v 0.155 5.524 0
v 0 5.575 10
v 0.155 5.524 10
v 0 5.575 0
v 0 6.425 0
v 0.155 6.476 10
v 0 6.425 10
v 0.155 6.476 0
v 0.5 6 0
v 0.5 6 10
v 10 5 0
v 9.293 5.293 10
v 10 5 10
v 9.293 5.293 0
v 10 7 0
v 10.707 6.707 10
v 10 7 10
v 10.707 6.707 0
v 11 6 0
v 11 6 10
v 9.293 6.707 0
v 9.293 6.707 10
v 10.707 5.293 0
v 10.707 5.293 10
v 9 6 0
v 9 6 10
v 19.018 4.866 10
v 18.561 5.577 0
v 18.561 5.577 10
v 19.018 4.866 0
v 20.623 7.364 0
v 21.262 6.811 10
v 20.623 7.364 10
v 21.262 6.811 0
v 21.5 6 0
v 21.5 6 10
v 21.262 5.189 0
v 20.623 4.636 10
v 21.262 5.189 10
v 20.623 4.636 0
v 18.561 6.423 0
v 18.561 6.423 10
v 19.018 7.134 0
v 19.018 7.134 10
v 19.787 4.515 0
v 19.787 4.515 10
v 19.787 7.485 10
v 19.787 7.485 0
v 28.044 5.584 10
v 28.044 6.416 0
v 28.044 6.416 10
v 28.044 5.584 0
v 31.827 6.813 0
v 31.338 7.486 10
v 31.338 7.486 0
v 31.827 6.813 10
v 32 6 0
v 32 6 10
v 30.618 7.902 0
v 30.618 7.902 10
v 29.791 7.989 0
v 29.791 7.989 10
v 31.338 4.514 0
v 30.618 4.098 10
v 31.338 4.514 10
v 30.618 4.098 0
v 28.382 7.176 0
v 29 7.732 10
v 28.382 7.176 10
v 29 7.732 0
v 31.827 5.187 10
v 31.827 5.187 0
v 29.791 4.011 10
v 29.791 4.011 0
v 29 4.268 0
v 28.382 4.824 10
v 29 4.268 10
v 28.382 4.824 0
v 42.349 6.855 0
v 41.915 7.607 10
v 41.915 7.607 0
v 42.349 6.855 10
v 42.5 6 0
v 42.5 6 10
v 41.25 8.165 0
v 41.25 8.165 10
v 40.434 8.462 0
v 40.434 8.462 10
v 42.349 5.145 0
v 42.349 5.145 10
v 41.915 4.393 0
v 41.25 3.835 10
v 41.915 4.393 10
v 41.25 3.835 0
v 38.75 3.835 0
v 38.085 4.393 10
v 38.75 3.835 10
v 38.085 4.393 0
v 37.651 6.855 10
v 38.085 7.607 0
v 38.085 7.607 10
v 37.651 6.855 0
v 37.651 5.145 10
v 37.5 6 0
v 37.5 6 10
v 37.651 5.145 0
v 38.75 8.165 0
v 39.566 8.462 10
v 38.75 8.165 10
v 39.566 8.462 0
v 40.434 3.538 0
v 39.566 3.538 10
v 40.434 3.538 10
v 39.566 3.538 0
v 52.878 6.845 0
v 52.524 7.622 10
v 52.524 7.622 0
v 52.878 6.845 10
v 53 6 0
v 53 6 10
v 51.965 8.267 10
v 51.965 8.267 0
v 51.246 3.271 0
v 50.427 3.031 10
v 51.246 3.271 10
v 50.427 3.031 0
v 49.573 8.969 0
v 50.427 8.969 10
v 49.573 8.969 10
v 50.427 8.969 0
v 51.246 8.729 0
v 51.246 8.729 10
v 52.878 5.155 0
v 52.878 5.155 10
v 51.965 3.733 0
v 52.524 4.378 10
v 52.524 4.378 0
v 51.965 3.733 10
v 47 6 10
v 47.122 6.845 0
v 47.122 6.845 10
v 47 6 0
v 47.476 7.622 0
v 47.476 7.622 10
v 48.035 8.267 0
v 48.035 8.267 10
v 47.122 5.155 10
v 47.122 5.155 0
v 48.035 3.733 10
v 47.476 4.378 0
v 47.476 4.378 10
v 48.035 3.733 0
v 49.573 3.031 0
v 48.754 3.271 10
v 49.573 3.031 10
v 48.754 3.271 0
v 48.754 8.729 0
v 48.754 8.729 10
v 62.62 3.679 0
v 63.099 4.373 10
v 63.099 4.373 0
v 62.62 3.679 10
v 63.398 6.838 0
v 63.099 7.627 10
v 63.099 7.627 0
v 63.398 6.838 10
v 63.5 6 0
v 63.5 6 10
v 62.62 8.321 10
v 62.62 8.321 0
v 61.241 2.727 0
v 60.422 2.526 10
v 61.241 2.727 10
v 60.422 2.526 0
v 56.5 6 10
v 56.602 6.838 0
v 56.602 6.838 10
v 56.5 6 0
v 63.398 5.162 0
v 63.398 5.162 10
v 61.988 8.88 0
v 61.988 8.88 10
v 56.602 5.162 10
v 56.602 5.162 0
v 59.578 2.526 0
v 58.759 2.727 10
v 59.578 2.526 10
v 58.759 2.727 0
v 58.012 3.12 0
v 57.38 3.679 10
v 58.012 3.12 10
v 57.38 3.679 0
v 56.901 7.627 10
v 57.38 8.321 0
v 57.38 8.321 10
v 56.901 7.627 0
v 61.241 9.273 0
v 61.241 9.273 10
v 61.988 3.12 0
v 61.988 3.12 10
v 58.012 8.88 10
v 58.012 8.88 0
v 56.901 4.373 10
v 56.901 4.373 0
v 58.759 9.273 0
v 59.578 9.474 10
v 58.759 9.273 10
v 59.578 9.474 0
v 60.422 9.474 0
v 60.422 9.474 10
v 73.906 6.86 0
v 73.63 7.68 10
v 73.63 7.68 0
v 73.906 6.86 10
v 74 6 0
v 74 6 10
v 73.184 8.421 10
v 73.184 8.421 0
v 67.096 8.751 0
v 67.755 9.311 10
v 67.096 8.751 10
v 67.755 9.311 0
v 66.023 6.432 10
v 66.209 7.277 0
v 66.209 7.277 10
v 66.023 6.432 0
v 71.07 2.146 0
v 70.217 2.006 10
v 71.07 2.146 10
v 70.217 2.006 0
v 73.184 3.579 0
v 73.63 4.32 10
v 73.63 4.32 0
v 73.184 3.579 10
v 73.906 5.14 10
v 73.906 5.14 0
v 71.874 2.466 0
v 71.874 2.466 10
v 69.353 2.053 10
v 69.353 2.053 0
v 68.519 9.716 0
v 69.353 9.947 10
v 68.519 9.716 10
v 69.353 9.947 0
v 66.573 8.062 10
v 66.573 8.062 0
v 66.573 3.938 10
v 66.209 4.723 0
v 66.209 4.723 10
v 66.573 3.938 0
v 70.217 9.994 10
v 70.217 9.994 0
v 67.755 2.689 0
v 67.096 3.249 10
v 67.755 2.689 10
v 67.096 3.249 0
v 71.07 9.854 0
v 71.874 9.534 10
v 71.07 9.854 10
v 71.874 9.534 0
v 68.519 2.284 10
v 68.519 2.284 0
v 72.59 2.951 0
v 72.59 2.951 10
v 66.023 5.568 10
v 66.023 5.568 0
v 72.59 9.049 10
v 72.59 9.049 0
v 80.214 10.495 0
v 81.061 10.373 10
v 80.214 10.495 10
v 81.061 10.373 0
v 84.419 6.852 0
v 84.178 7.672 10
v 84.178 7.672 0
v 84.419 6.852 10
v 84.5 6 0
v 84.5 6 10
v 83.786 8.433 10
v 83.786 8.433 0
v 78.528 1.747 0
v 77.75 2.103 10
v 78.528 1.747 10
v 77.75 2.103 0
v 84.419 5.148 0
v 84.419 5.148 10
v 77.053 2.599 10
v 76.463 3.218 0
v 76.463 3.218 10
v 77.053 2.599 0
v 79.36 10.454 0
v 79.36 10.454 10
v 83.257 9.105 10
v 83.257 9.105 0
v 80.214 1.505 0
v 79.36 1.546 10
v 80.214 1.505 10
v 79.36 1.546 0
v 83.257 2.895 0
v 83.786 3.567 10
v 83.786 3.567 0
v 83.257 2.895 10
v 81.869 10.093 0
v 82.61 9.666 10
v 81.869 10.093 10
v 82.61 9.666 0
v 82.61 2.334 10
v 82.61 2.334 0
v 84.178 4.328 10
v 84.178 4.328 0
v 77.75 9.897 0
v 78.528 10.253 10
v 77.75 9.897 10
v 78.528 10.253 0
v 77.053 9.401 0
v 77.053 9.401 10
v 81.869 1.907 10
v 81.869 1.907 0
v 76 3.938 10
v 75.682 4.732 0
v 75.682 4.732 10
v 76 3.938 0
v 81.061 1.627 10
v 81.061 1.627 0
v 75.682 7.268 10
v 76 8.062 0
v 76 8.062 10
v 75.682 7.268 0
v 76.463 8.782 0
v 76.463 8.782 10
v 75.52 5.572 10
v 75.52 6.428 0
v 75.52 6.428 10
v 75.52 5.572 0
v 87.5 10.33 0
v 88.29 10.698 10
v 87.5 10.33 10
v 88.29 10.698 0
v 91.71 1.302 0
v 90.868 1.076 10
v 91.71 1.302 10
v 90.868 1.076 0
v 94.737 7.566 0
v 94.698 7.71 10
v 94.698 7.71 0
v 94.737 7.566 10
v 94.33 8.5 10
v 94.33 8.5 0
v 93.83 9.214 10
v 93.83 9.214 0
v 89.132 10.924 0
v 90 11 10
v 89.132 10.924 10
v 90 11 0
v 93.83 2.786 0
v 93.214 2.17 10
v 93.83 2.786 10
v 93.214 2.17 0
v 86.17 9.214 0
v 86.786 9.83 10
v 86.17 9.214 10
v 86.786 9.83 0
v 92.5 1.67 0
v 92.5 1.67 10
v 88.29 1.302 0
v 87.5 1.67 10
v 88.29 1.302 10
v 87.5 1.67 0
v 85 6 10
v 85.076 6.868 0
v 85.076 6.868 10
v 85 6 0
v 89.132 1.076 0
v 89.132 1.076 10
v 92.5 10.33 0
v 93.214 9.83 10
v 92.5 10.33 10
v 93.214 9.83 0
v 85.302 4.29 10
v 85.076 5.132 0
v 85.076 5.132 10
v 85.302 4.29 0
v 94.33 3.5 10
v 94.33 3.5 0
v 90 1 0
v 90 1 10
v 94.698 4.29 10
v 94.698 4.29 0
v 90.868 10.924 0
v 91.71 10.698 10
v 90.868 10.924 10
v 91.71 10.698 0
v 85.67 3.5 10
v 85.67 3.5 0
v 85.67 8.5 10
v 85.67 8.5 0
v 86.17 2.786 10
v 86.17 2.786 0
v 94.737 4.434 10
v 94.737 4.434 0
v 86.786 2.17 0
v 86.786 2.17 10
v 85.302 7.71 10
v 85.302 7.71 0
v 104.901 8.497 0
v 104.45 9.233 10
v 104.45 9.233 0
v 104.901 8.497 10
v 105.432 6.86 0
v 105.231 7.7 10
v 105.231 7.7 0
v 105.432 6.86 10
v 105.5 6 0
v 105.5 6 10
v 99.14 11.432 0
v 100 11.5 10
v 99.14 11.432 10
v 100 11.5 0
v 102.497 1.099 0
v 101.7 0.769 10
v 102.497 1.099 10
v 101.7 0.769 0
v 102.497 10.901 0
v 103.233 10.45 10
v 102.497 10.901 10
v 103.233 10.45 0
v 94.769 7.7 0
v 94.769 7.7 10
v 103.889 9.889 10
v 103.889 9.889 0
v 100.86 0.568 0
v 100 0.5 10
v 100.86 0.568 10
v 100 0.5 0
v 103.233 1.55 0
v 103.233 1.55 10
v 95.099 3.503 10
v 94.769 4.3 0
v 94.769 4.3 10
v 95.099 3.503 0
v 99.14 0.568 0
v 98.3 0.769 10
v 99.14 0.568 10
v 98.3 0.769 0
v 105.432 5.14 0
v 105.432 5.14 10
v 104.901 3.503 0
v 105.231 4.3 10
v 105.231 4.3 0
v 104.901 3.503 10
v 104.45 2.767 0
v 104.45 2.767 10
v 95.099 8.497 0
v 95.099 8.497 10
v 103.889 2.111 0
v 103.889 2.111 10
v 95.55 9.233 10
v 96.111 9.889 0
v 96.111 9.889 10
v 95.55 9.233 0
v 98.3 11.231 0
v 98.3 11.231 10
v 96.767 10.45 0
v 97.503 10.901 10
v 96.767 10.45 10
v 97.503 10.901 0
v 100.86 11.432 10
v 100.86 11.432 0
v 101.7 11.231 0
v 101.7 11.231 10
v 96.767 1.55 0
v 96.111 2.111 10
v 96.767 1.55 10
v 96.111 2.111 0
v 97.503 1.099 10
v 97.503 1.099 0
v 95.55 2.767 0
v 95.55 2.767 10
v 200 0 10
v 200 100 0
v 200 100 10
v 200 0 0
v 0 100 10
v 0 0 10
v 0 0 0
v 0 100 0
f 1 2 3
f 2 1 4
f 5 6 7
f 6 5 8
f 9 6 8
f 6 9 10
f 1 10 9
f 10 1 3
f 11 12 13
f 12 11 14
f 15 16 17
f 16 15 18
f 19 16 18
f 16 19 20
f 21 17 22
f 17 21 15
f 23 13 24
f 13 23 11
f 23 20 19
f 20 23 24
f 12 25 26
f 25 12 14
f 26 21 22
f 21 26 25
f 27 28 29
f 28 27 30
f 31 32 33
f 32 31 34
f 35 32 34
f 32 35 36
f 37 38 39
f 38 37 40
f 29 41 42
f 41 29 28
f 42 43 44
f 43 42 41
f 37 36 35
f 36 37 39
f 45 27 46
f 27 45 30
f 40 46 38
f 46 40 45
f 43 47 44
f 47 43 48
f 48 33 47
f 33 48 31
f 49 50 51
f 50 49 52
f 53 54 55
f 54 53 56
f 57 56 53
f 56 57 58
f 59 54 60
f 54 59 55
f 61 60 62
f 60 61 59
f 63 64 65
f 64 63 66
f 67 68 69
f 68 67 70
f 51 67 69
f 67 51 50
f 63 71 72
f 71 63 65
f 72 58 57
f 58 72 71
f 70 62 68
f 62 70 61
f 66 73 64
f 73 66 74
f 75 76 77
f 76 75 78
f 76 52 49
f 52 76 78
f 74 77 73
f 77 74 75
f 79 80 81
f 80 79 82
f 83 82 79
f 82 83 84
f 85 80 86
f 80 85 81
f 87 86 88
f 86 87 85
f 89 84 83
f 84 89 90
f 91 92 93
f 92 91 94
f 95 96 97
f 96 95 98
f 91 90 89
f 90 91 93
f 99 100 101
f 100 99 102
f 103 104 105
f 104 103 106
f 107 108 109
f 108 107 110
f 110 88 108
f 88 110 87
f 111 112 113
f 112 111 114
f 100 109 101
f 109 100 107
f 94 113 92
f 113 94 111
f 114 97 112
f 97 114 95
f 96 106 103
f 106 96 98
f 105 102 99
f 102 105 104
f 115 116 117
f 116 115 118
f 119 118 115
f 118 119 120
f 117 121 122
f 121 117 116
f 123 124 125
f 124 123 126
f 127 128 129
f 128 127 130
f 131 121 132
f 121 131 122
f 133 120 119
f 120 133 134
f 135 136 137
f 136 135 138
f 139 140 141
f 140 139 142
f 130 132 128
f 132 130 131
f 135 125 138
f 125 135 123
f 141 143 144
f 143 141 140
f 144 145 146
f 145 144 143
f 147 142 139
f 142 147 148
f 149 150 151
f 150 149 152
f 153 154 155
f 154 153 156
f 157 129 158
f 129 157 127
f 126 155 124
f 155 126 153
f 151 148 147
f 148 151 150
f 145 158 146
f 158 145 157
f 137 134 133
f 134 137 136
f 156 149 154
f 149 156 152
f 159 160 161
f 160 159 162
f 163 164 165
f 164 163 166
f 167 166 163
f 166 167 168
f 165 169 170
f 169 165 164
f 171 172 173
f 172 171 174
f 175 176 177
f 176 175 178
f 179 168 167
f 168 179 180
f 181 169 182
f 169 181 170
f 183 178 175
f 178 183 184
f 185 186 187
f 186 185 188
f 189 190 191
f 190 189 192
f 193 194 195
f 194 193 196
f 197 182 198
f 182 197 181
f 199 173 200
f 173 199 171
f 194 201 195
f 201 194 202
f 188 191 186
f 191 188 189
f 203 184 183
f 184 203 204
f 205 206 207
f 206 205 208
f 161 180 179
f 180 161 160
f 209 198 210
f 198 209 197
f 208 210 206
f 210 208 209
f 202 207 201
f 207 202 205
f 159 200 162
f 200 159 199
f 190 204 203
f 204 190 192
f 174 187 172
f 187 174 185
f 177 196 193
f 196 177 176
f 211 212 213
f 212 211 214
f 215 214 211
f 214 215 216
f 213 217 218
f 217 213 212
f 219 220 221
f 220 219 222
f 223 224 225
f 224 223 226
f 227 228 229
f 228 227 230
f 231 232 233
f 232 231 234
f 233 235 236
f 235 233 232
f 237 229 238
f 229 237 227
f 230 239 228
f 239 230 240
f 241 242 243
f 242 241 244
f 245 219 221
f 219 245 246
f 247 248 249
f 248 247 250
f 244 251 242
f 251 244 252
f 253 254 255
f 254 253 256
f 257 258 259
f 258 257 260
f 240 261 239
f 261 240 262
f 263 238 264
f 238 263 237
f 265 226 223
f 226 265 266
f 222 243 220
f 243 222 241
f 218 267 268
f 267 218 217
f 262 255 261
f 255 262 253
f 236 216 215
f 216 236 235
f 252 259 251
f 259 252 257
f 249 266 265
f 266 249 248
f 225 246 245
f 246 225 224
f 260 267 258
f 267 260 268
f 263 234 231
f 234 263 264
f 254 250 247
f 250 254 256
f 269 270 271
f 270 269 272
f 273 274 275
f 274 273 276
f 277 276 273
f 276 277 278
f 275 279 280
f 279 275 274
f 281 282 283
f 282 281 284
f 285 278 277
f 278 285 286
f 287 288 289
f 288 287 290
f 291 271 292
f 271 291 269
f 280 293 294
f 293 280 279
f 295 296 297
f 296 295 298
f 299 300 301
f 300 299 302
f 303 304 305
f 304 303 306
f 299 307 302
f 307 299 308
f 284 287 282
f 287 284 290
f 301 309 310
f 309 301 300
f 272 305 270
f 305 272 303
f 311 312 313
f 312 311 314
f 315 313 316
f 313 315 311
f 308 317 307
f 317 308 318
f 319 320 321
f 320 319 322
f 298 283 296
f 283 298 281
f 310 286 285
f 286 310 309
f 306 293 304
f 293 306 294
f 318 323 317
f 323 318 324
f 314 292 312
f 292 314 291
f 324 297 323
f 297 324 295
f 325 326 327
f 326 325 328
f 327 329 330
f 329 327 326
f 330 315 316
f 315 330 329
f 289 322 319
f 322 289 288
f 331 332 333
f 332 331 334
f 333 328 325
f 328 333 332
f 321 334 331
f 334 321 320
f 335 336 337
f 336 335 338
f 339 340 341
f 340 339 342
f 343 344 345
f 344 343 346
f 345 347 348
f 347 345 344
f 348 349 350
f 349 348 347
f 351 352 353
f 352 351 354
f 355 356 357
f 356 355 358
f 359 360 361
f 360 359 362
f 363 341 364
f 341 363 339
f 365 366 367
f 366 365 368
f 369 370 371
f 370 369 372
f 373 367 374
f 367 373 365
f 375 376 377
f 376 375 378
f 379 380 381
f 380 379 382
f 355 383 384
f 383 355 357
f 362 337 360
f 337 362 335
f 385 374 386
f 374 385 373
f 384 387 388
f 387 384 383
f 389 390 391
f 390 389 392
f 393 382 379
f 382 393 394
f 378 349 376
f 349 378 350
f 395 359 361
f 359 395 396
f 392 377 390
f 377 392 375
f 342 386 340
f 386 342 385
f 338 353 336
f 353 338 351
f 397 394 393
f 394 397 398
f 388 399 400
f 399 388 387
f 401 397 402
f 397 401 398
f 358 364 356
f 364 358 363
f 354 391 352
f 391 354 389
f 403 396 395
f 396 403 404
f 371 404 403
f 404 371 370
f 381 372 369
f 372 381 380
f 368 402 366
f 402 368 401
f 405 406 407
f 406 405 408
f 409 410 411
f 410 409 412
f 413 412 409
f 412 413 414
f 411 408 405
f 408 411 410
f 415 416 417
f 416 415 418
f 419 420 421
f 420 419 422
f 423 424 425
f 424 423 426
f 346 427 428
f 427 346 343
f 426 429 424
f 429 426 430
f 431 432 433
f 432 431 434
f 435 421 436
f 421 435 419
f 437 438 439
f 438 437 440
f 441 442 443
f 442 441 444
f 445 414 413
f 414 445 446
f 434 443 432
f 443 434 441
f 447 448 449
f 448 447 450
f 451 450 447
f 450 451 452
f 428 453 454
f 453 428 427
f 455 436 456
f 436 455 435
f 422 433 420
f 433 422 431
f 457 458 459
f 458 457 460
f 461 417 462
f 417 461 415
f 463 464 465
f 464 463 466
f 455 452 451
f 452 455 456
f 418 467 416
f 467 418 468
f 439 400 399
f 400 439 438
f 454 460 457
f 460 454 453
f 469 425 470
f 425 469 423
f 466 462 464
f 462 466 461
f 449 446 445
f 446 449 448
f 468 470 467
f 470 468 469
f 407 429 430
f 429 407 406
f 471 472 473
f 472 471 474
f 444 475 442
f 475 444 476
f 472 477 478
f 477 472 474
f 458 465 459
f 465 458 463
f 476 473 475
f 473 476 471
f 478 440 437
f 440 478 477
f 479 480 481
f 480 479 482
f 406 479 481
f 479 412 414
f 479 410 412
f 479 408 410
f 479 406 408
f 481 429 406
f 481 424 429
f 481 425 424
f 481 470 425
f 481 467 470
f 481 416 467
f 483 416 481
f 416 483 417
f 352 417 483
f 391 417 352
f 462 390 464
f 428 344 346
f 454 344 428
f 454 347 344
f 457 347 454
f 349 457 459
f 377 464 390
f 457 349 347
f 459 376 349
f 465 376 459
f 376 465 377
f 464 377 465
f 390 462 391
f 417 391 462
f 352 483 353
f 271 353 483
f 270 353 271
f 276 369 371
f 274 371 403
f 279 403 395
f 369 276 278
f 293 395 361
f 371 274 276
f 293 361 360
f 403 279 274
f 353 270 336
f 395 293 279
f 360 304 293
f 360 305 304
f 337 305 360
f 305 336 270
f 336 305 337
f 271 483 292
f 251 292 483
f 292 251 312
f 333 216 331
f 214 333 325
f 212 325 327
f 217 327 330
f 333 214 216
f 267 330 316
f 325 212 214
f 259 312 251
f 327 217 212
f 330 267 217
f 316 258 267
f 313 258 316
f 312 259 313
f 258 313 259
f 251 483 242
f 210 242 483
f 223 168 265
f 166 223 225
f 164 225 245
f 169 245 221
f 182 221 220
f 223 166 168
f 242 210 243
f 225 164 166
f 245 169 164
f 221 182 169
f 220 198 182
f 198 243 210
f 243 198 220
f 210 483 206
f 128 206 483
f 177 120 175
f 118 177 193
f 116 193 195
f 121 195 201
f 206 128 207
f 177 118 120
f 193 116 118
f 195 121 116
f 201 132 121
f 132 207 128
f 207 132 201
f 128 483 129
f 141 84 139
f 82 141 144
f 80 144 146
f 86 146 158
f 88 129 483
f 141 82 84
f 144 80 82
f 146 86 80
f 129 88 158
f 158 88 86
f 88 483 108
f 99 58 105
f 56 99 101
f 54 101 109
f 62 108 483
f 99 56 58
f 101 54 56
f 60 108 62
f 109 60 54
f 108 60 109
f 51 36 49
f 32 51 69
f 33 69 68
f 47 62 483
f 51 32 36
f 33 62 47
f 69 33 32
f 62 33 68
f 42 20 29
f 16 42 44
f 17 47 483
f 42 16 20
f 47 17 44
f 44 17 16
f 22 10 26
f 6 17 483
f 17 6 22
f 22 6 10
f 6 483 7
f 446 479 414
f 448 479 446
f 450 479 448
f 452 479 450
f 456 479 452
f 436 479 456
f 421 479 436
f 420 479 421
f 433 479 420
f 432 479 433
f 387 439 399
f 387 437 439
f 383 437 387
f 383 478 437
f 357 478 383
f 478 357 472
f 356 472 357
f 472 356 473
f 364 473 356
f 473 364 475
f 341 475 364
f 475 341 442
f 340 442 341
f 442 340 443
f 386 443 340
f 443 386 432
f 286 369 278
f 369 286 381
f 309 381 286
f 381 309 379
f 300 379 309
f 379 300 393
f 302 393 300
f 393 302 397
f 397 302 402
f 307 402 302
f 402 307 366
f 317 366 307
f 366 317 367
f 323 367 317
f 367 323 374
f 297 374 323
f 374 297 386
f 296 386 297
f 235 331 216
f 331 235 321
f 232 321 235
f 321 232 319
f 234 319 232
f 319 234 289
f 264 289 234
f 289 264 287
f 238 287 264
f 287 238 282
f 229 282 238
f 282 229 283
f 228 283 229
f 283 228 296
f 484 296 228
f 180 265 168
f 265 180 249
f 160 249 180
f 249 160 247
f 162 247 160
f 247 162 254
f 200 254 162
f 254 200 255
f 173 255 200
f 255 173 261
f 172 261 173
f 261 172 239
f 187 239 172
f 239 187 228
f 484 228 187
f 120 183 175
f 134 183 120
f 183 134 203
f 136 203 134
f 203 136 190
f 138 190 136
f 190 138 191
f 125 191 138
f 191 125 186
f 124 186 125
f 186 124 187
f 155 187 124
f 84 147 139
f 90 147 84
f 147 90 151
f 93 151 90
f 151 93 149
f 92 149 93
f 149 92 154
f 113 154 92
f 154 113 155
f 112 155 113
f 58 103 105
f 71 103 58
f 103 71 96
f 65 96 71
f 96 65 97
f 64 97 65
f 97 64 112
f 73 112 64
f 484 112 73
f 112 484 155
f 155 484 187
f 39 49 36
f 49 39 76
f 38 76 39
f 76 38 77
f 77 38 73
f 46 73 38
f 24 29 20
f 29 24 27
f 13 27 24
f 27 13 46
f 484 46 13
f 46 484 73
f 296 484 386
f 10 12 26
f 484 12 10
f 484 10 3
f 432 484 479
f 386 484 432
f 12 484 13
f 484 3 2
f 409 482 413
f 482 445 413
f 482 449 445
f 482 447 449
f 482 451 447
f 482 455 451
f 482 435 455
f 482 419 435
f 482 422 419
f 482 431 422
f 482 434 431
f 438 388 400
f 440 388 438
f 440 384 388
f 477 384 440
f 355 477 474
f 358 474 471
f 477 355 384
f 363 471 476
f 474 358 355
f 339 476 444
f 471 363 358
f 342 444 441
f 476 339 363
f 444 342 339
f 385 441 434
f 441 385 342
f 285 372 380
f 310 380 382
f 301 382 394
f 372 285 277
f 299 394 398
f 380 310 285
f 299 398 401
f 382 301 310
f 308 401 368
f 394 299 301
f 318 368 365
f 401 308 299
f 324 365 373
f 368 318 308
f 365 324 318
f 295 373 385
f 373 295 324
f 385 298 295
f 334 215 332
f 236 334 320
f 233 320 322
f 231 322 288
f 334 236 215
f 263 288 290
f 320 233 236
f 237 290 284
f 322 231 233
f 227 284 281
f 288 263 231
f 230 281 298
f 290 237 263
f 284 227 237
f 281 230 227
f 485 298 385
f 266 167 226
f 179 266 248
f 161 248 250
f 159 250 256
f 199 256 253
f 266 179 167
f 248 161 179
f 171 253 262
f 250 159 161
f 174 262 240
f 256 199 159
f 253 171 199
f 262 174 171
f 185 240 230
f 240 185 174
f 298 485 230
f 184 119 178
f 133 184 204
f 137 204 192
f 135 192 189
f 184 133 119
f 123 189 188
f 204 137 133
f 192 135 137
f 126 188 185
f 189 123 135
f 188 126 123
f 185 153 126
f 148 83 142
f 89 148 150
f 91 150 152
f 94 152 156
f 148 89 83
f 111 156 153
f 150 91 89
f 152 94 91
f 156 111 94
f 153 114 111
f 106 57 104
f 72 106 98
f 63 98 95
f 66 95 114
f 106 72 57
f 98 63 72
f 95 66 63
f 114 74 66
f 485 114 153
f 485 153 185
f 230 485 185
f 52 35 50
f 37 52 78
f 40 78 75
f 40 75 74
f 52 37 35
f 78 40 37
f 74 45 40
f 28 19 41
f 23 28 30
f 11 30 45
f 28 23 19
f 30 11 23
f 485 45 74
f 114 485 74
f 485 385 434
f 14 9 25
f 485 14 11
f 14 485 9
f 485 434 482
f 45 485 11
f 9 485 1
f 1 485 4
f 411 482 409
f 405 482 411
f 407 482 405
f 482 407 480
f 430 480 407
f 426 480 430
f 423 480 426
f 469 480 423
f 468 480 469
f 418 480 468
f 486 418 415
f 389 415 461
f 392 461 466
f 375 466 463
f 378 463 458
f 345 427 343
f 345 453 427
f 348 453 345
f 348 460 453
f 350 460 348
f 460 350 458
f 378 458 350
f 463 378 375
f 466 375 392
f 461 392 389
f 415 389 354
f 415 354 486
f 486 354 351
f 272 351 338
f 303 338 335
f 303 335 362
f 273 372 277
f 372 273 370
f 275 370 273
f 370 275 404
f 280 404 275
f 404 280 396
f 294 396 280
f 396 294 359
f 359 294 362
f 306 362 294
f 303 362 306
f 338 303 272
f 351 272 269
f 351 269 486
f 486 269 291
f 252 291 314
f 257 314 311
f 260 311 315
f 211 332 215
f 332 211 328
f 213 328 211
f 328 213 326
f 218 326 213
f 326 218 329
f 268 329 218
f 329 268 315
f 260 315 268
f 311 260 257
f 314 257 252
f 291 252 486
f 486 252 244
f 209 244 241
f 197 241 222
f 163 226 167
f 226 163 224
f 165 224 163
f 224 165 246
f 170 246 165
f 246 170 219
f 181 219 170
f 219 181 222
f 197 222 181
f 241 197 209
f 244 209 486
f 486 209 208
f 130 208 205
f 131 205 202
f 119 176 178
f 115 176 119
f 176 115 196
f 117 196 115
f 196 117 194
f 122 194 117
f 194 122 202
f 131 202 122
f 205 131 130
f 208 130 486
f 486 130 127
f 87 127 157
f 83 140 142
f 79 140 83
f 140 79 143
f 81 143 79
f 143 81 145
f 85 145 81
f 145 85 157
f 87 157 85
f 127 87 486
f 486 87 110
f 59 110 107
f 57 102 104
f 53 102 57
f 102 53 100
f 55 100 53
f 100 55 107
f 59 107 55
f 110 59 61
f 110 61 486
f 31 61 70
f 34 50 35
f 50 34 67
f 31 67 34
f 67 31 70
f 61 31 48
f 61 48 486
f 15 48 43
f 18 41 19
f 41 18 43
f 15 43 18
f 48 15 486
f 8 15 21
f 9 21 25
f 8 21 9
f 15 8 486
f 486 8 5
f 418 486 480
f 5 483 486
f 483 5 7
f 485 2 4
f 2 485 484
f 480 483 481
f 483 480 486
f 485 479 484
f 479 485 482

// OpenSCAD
$fa=6;
$fs=1.75/2;

MIN_DIAMETER=1;
DIAMETER_INCREMENT=1;

module holes() {
    for (i=[0:10])
        translate([i*10,6,-1]) cylinder(r=MIN_DIAMETER/2 + i*DIAMETER_INCREMENT/2, h=20);
}

module block() {
    cube([200,100,10]);
}

difference() {
    block();
    holes();
}
